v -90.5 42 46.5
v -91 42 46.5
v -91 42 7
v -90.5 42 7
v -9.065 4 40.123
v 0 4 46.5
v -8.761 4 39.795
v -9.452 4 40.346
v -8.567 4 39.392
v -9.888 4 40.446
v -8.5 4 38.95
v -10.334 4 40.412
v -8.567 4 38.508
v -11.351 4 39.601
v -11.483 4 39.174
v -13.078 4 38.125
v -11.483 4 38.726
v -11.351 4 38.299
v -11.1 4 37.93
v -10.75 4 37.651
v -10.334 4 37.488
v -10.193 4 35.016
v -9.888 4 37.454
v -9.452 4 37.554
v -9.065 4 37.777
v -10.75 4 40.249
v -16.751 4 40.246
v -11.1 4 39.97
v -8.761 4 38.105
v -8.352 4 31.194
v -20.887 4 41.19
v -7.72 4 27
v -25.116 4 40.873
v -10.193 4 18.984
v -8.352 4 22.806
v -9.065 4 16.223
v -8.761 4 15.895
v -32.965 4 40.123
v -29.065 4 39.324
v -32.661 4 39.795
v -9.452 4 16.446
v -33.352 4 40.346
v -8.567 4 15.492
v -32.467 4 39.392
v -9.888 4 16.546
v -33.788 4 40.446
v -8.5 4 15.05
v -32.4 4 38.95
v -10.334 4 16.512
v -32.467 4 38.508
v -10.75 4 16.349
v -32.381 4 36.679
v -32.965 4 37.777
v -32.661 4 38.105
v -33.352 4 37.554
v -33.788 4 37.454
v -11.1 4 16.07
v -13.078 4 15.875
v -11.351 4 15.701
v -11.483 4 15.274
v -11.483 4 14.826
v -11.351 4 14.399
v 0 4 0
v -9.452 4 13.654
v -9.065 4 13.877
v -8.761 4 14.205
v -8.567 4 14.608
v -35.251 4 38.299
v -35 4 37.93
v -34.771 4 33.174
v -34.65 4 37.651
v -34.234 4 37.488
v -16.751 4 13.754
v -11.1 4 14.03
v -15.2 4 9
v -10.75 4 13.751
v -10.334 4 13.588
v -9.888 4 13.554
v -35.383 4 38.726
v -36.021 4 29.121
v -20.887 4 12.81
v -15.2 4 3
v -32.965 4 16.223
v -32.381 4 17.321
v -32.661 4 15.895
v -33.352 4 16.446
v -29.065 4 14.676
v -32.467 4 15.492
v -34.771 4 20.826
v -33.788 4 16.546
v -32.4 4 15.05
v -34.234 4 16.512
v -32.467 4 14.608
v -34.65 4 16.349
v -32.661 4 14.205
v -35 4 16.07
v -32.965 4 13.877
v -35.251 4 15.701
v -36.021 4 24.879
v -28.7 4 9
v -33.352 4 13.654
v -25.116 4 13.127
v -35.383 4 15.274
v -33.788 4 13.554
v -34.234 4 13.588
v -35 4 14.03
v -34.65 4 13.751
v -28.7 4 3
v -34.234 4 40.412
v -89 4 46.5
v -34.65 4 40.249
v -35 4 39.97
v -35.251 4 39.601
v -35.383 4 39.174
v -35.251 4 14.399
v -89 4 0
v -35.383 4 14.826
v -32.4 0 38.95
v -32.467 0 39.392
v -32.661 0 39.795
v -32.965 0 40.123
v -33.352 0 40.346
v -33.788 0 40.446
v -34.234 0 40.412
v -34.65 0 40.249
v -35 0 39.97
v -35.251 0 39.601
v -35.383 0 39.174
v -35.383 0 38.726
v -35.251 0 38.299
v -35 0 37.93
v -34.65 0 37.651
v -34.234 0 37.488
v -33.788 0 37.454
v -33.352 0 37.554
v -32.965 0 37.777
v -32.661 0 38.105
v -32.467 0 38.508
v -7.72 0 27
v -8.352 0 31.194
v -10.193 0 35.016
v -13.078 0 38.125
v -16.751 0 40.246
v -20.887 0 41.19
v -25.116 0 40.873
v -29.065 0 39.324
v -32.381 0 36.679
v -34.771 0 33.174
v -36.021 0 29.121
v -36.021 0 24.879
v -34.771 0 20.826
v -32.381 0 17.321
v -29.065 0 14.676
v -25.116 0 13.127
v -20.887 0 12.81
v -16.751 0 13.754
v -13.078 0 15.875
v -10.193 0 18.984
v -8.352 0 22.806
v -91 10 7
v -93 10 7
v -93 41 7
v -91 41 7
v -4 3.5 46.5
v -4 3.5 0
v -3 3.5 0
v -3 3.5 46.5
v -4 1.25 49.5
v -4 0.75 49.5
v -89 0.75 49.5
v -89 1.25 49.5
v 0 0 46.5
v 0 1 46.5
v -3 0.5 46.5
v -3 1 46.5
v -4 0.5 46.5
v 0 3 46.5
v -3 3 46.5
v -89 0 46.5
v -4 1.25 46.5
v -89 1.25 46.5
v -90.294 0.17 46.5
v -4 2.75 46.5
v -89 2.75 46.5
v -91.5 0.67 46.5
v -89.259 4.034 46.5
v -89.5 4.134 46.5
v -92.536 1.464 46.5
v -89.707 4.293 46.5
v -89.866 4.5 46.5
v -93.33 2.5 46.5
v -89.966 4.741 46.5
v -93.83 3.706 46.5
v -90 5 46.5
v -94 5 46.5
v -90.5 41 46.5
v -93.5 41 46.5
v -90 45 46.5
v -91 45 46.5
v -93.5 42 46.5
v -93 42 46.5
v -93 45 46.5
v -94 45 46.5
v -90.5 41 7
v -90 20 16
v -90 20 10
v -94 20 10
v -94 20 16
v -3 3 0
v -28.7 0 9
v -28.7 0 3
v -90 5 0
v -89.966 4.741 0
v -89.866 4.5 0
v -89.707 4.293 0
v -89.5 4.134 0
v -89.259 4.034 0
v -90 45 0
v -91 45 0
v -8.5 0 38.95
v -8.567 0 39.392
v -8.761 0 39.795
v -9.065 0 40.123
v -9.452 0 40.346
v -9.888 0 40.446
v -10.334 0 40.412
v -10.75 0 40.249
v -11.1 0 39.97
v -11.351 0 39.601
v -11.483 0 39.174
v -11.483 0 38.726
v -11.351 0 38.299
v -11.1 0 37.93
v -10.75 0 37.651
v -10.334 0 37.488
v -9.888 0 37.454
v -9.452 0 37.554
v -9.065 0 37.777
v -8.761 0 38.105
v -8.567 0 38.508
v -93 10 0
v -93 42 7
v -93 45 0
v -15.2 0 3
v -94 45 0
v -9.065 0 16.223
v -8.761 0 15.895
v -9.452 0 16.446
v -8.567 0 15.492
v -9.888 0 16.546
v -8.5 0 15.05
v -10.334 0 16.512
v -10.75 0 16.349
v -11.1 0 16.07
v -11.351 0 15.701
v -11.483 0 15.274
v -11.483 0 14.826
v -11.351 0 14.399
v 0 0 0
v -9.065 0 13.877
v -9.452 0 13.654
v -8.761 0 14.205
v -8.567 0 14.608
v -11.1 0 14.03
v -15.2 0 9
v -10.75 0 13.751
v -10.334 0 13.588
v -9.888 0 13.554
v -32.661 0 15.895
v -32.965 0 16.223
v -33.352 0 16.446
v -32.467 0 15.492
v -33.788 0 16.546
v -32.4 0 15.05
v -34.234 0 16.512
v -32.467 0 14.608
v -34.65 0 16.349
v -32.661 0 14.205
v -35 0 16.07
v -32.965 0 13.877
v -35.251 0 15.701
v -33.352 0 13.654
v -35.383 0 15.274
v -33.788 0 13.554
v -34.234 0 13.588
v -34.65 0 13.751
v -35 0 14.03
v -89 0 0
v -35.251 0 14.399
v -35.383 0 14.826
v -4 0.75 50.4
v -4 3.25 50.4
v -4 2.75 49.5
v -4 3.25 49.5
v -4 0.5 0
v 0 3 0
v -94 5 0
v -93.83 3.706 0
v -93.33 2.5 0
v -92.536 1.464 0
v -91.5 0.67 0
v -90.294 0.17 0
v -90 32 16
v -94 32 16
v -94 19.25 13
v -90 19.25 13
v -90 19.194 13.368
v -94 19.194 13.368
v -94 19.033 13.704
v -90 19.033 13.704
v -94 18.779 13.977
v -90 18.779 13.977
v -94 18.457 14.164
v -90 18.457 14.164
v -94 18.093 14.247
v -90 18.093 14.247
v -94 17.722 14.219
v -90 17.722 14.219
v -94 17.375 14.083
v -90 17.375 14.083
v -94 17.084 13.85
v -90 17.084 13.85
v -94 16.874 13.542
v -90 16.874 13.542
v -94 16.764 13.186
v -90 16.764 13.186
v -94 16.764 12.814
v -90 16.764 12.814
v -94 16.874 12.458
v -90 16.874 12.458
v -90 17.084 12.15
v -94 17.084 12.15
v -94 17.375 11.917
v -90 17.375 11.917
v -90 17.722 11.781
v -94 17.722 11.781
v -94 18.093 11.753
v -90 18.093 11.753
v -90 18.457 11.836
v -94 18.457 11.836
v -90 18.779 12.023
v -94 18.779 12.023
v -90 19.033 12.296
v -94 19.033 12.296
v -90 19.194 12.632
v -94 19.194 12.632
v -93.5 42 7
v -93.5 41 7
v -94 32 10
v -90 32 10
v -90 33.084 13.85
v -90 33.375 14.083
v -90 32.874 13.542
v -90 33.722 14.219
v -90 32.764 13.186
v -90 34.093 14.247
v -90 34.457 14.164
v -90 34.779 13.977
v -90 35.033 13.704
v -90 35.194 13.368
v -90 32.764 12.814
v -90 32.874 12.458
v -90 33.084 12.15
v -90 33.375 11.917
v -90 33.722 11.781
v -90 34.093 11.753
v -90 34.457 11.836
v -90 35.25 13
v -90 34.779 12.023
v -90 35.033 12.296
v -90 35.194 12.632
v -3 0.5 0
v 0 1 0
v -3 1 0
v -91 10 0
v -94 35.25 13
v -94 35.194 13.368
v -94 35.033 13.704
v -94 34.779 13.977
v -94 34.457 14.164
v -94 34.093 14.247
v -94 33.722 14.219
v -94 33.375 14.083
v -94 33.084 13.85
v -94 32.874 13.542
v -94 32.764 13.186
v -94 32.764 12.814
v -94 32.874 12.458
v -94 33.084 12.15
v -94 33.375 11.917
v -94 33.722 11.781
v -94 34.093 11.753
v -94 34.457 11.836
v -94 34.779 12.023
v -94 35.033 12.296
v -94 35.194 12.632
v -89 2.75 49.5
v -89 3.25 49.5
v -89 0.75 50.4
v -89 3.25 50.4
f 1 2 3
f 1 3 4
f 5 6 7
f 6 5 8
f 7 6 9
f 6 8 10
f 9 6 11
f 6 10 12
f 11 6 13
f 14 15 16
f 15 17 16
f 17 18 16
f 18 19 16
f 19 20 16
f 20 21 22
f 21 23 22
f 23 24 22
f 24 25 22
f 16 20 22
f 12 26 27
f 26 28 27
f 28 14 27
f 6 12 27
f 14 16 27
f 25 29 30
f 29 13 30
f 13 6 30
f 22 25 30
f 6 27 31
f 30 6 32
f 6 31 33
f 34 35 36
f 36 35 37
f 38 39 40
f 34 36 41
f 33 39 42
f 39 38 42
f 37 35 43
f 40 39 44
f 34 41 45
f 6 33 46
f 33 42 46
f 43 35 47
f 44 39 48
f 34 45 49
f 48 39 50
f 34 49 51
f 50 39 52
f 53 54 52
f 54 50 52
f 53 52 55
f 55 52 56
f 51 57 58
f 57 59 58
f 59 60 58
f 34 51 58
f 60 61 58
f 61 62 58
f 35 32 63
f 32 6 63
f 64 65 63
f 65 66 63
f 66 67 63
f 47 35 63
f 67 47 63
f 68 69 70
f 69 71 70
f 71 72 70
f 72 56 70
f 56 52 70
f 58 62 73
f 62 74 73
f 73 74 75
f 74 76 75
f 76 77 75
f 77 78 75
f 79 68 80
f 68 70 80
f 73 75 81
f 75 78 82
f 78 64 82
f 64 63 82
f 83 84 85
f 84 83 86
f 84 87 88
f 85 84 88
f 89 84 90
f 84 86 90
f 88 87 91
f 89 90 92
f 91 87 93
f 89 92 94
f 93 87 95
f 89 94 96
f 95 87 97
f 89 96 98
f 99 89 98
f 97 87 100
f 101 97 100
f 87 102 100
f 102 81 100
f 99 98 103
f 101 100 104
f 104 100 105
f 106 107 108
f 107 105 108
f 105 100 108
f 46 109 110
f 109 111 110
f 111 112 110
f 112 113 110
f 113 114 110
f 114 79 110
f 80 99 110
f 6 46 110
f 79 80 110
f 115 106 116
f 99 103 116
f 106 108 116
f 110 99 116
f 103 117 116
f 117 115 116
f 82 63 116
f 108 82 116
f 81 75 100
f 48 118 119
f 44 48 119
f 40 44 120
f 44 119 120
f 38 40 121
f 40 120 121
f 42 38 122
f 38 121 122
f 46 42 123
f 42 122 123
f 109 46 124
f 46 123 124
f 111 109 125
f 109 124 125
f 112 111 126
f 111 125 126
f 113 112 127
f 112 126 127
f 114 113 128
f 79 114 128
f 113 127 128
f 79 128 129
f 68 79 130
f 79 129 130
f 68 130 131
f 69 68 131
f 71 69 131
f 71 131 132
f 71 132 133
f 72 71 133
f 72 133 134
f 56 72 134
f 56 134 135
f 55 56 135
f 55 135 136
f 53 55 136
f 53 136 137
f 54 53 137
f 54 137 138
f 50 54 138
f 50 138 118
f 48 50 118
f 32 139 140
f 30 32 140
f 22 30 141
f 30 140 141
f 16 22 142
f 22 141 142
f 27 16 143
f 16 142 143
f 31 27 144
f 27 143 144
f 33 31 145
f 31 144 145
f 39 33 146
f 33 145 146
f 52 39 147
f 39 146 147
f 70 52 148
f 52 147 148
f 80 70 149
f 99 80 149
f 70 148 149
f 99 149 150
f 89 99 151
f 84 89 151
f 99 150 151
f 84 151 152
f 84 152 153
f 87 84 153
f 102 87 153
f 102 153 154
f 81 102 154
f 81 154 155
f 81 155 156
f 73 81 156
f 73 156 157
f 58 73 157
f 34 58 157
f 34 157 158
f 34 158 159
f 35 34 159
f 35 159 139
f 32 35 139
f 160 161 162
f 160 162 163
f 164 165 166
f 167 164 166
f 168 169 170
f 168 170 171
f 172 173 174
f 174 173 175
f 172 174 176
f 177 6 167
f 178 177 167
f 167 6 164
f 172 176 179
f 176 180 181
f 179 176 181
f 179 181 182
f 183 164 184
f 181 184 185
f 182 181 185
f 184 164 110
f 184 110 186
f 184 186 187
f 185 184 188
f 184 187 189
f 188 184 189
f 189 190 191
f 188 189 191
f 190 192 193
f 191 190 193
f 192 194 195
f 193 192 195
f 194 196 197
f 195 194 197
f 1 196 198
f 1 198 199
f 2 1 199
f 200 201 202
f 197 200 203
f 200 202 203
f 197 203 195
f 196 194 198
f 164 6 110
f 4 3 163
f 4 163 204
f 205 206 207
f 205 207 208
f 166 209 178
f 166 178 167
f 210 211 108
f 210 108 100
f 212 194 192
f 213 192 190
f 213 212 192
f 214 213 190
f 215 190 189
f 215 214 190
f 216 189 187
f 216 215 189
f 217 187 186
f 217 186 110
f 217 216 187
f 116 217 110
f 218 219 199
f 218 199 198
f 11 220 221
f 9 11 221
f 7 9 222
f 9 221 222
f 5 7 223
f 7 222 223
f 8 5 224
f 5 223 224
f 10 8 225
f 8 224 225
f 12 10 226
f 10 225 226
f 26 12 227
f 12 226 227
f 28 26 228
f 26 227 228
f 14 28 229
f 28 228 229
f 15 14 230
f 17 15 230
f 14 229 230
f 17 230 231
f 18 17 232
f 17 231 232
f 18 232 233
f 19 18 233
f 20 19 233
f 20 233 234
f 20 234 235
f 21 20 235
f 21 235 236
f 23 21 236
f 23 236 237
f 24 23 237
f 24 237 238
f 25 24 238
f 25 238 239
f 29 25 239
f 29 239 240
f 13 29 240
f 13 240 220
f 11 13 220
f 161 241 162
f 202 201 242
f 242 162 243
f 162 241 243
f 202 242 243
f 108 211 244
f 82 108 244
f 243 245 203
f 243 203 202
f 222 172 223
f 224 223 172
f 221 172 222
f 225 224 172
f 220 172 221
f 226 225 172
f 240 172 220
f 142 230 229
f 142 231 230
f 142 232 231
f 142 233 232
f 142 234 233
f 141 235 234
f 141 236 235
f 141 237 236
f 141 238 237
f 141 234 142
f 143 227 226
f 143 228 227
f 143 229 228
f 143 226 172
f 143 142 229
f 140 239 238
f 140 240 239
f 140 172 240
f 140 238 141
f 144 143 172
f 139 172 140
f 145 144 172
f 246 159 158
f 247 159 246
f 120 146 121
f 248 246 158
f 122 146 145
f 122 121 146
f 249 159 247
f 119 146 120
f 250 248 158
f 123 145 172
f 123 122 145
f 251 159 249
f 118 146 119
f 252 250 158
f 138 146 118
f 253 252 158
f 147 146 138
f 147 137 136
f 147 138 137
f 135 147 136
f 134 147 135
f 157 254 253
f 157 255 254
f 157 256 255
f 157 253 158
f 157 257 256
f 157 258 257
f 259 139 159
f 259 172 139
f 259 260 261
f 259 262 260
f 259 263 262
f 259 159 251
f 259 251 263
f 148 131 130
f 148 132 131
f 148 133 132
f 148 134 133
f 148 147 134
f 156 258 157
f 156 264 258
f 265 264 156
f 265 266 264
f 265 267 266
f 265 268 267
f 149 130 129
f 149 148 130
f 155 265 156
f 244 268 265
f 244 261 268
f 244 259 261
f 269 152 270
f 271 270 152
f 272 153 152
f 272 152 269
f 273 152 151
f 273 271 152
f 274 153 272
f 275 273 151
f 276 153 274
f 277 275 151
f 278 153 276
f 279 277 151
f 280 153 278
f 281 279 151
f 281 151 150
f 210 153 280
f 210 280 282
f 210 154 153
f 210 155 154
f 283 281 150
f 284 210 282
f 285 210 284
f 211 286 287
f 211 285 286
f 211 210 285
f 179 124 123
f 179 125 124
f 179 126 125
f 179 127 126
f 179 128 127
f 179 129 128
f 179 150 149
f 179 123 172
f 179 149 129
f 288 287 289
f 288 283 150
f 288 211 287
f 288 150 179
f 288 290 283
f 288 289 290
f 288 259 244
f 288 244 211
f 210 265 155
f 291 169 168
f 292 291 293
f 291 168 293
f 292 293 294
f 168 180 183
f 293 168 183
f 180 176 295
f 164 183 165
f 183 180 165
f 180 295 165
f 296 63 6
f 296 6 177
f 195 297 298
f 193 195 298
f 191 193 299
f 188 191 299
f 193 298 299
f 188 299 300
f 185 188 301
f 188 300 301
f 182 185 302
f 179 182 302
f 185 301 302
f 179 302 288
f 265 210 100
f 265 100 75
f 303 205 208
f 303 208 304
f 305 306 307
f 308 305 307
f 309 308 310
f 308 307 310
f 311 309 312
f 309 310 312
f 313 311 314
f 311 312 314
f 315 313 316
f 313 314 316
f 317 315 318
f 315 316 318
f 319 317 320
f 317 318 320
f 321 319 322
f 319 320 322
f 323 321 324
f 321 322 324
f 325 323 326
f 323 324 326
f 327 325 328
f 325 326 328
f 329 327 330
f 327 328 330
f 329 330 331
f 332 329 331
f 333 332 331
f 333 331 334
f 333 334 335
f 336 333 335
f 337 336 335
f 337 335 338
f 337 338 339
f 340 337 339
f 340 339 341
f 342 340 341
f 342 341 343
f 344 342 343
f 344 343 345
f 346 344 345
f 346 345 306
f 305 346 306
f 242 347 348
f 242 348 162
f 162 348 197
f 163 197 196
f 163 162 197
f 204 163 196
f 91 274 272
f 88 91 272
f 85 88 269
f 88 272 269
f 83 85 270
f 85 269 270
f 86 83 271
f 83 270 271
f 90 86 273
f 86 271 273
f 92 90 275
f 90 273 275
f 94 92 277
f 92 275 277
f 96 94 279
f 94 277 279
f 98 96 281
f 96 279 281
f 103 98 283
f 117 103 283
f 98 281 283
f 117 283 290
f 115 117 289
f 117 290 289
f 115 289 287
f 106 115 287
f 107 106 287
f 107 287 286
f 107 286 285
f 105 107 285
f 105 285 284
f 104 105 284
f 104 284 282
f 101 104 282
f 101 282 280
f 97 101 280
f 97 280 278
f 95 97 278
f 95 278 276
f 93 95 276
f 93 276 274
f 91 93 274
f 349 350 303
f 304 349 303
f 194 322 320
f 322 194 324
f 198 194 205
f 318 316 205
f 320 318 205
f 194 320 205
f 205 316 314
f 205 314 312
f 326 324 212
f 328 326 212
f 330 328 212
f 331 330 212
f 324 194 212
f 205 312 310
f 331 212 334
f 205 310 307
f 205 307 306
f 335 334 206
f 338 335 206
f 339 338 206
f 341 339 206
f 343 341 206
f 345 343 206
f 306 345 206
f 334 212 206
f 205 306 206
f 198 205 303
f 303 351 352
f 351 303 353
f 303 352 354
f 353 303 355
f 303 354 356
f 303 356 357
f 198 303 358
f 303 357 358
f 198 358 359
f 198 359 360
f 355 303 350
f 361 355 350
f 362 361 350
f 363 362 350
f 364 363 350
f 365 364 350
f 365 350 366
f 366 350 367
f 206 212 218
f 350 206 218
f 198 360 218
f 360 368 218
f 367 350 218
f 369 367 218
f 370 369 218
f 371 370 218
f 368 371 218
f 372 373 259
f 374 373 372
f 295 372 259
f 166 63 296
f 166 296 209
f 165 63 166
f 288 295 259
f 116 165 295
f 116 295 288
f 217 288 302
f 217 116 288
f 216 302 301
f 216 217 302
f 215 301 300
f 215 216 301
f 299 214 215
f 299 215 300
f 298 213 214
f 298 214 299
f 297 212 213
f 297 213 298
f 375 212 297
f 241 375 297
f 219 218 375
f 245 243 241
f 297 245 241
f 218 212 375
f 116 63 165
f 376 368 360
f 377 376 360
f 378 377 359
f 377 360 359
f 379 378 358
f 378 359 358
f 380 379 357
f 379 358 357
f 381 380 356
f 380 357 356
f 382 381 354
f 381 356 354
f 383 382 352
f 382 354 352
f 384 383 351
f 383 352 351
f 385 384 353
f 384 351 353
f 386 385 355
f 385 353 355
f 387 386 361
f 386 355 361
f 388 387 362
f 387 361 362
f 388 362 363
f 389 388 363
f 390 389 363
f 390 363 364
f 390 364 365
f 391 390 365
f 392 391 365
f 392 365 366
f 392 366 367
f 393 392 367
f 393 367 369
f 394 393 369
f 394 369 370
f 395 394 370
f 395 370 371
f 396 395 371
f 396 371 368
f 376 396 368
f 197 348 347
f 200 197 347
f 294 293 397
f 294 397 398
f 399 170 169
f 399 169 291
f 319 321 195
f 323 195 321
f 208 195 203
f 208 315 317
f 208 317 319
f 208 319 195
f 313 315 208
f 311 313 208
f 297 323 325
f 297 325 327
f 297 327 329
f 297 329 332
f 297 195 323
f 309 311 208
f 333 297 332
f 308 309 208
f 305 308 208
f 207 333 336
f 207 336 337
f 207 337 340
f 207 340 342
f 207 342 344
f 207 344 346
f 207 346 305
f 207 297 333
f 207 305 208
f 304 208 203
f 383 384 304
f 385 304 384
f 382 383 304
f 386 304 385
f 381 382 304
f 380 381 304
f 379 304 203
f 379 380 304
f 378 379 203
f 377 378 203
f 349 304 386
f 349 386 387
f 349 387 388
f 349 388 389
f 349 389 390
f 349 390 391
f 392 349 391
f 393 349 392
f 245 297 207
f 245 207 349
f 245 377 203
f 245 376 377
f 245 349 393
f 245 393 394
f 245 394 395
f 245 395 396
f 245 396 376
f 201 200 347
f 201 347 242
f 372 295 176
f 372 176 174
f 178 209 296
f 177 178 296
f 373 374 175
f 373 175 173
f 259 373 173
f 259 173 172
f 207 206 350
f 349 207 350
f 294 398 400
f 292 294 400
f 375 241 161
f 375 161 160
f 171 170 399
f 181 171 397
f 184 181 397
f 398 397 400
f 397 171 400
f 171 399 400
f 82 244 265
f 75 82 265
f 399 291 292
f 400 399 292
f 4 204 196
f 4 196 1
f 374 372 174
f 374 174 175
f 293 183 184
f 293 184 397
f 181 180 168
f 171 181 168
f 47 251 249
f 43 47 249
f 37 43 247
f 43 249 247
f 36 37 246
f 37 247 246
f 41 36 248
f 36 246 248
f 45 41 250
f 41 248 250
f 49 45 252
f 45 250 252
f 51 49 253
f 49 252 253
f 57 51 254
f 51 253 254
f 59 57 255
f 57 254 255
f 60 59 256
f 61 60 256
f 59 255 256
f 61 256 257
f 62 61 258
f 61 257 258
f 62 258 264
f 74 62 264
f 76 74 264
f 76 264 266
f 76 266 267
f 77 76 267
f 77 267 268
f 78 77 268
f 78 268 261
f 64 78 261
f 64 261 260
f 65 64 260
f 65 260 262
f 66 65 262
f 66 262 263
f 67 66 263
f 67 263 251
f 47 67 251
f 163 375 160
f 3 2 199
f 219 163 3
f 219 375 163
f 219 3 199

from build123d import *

# Parameters (mm, degrees)
PAD_DEPTH       = 46.5
SKETCH114_W     = 3
SKETCH114_H     = 2
SKETCH114_W_2   = 1
SKETCH114_H_2   = 3
POCKET_DEPTH    = 46.501
SKETCH116_R     = 14.23
SKETCH116_R_2   = 1.5
POCKET001_DEPTH = 5
SKETCH_W        = 2
SKETCH_H        = 35
POCKET002_DEPTH = 7
POCKET003_START = 7
SKETCH117_W     = 2
SKETCH117_H     = 3
SKETCH117_W_2   = 3
SKETCH117_H_2   = 1
POCKET003_DEPTH = 40
PAD001_START    = -4
SKETCH119_W     = 1.5
SKETCH119_H     = 3
SKETCH119_W_2   = 2.5
SKETCH119_H_2   = 0.9
PAD001_DEPTH    = 85
SKETCH118_R     = 1.25
SKETCH118_W     = 12
SKETCH118_H     = 6
POCKET004_DEPTH = 94.001
SKETCH120_W     = 13.5
SKETCH120_H     = 6
POCKET005_DEPTH = 5


with BuildPart() as part:
    # Sketch112 → Pad (new body)
    with BuildSketch(Plane.XY):
        with BuildLine():
            Line((0, 0), (-89, 0))
            ThreePointArc((-94, 5), (-92.535534, 1.464466), (-89, 0))
            Line((-94, 5), (-94, 45))
            Line((-94, 45), (-90, 45))
            Line((-90, 5), (-90, 45))
            ThreePointArc((-90, 5), (-89.707107, 4.292893), (-89, 4))
            Line((0, 4), (-89, 4))
            Line((0, 4), (0, 0))
        make_face()
    extrude(amount=PAD_DEPTH)

    # Sketch114 → Pocket (cut, through all)
    with BuildSketch(Plane.XY):
        with Locations((-1.5, 2)):
            Rectangle(SKETCH114_W, SKETCH114_H)
        with Locations((-3.5, 2)):
            Rectangle(SKETCH114_W_2, SKETCH114_H_2)
    extrude(amount=POCKET_DEPTH, mode=Mode.SUBTRACT)

    # Sketch116 → Pocket001 (cut)
    with BuildSketch(Plane.XZ):
        with Locations((-21.95, 27)):
            Circle(SKETCH116_R)
        with Locations((-10, 38.95)):
            Circle(SKETCH116_R_2)
        with Locations((-33.9, 38.95)):
            Circle(SKETCH116_R_2)
        with Locations((-33.9, 15.05)):
            Circle(SKETCH116_R_2)
        with Locations((-10, 15.05)):
            Circle(SKETCH116_R_2)
    extrude(amount=-POCKET001_DEPTH, mode=Mode.SUBTRACT)

    # Sketch → Pocket002 (cut)
    with BuildSketch(Plane.XY):
        with Locations((-92, 27.5)):
            Rectangle(SKETCH_W, SKETCH_H)
    extrude(amount=POCKET002_DEPTH, mode=Mode.SUBTRACT)

    # Sketch117 → Pocket003 (cut)
    with BuildSketch(Plane.XY.offset(POCKET003_START)):
        with Locations((-92, 43.5)):
            Rectangle(SKETCH117_W, SKETCH117_H)
        with Locations((-92, 41.5)):
            Rectangle(SKETCH117_W_2, SKETCH117_H_2)
    extrude(amount=POCKET003_DEPTH, mode=Mode.SUBTRACT)

    # Sketch119 → Pad001 (join)
    with BuildSketch(Plane.YZ.offset(PAD001_START)):
        with Locations((2, 48)):
            Rectangle(SKETCH119_W, SKETCH119_H)
        with Locations((2, 49.95)):
            Rectangle(SKETCH119_W_2, SKETCH119_H_2)
    extrude(amount=-PAD001_DEPTH)

    # Sketch118 → Pocket004 (cut, through all)
    with BuildSketch(Plane.YZ):
        with Locations((34, 13)):
            Circle(SKETCH118_R)
        with Locations((18, 13)):
            Circle(SKETCH118_R)
        with Locations((26, 13)):
            Rectangle(SKETCH118_W, SKETCH118_H)
    extrude(amount=-POCKET004_DEPTH, mode=Mode.SUBTRACT)

    # Sketch120 → Pocket005 (cut)
    with BuildSketch(Plane.XZ):
        with Locations((-21.95, 6)):
            Rectangle(SKETCH120_W, SKETCH120_H)
    extrude(amount=-POCKET005_DEPTH, mode=Mode.SUBTRACT)


solid = part.part
